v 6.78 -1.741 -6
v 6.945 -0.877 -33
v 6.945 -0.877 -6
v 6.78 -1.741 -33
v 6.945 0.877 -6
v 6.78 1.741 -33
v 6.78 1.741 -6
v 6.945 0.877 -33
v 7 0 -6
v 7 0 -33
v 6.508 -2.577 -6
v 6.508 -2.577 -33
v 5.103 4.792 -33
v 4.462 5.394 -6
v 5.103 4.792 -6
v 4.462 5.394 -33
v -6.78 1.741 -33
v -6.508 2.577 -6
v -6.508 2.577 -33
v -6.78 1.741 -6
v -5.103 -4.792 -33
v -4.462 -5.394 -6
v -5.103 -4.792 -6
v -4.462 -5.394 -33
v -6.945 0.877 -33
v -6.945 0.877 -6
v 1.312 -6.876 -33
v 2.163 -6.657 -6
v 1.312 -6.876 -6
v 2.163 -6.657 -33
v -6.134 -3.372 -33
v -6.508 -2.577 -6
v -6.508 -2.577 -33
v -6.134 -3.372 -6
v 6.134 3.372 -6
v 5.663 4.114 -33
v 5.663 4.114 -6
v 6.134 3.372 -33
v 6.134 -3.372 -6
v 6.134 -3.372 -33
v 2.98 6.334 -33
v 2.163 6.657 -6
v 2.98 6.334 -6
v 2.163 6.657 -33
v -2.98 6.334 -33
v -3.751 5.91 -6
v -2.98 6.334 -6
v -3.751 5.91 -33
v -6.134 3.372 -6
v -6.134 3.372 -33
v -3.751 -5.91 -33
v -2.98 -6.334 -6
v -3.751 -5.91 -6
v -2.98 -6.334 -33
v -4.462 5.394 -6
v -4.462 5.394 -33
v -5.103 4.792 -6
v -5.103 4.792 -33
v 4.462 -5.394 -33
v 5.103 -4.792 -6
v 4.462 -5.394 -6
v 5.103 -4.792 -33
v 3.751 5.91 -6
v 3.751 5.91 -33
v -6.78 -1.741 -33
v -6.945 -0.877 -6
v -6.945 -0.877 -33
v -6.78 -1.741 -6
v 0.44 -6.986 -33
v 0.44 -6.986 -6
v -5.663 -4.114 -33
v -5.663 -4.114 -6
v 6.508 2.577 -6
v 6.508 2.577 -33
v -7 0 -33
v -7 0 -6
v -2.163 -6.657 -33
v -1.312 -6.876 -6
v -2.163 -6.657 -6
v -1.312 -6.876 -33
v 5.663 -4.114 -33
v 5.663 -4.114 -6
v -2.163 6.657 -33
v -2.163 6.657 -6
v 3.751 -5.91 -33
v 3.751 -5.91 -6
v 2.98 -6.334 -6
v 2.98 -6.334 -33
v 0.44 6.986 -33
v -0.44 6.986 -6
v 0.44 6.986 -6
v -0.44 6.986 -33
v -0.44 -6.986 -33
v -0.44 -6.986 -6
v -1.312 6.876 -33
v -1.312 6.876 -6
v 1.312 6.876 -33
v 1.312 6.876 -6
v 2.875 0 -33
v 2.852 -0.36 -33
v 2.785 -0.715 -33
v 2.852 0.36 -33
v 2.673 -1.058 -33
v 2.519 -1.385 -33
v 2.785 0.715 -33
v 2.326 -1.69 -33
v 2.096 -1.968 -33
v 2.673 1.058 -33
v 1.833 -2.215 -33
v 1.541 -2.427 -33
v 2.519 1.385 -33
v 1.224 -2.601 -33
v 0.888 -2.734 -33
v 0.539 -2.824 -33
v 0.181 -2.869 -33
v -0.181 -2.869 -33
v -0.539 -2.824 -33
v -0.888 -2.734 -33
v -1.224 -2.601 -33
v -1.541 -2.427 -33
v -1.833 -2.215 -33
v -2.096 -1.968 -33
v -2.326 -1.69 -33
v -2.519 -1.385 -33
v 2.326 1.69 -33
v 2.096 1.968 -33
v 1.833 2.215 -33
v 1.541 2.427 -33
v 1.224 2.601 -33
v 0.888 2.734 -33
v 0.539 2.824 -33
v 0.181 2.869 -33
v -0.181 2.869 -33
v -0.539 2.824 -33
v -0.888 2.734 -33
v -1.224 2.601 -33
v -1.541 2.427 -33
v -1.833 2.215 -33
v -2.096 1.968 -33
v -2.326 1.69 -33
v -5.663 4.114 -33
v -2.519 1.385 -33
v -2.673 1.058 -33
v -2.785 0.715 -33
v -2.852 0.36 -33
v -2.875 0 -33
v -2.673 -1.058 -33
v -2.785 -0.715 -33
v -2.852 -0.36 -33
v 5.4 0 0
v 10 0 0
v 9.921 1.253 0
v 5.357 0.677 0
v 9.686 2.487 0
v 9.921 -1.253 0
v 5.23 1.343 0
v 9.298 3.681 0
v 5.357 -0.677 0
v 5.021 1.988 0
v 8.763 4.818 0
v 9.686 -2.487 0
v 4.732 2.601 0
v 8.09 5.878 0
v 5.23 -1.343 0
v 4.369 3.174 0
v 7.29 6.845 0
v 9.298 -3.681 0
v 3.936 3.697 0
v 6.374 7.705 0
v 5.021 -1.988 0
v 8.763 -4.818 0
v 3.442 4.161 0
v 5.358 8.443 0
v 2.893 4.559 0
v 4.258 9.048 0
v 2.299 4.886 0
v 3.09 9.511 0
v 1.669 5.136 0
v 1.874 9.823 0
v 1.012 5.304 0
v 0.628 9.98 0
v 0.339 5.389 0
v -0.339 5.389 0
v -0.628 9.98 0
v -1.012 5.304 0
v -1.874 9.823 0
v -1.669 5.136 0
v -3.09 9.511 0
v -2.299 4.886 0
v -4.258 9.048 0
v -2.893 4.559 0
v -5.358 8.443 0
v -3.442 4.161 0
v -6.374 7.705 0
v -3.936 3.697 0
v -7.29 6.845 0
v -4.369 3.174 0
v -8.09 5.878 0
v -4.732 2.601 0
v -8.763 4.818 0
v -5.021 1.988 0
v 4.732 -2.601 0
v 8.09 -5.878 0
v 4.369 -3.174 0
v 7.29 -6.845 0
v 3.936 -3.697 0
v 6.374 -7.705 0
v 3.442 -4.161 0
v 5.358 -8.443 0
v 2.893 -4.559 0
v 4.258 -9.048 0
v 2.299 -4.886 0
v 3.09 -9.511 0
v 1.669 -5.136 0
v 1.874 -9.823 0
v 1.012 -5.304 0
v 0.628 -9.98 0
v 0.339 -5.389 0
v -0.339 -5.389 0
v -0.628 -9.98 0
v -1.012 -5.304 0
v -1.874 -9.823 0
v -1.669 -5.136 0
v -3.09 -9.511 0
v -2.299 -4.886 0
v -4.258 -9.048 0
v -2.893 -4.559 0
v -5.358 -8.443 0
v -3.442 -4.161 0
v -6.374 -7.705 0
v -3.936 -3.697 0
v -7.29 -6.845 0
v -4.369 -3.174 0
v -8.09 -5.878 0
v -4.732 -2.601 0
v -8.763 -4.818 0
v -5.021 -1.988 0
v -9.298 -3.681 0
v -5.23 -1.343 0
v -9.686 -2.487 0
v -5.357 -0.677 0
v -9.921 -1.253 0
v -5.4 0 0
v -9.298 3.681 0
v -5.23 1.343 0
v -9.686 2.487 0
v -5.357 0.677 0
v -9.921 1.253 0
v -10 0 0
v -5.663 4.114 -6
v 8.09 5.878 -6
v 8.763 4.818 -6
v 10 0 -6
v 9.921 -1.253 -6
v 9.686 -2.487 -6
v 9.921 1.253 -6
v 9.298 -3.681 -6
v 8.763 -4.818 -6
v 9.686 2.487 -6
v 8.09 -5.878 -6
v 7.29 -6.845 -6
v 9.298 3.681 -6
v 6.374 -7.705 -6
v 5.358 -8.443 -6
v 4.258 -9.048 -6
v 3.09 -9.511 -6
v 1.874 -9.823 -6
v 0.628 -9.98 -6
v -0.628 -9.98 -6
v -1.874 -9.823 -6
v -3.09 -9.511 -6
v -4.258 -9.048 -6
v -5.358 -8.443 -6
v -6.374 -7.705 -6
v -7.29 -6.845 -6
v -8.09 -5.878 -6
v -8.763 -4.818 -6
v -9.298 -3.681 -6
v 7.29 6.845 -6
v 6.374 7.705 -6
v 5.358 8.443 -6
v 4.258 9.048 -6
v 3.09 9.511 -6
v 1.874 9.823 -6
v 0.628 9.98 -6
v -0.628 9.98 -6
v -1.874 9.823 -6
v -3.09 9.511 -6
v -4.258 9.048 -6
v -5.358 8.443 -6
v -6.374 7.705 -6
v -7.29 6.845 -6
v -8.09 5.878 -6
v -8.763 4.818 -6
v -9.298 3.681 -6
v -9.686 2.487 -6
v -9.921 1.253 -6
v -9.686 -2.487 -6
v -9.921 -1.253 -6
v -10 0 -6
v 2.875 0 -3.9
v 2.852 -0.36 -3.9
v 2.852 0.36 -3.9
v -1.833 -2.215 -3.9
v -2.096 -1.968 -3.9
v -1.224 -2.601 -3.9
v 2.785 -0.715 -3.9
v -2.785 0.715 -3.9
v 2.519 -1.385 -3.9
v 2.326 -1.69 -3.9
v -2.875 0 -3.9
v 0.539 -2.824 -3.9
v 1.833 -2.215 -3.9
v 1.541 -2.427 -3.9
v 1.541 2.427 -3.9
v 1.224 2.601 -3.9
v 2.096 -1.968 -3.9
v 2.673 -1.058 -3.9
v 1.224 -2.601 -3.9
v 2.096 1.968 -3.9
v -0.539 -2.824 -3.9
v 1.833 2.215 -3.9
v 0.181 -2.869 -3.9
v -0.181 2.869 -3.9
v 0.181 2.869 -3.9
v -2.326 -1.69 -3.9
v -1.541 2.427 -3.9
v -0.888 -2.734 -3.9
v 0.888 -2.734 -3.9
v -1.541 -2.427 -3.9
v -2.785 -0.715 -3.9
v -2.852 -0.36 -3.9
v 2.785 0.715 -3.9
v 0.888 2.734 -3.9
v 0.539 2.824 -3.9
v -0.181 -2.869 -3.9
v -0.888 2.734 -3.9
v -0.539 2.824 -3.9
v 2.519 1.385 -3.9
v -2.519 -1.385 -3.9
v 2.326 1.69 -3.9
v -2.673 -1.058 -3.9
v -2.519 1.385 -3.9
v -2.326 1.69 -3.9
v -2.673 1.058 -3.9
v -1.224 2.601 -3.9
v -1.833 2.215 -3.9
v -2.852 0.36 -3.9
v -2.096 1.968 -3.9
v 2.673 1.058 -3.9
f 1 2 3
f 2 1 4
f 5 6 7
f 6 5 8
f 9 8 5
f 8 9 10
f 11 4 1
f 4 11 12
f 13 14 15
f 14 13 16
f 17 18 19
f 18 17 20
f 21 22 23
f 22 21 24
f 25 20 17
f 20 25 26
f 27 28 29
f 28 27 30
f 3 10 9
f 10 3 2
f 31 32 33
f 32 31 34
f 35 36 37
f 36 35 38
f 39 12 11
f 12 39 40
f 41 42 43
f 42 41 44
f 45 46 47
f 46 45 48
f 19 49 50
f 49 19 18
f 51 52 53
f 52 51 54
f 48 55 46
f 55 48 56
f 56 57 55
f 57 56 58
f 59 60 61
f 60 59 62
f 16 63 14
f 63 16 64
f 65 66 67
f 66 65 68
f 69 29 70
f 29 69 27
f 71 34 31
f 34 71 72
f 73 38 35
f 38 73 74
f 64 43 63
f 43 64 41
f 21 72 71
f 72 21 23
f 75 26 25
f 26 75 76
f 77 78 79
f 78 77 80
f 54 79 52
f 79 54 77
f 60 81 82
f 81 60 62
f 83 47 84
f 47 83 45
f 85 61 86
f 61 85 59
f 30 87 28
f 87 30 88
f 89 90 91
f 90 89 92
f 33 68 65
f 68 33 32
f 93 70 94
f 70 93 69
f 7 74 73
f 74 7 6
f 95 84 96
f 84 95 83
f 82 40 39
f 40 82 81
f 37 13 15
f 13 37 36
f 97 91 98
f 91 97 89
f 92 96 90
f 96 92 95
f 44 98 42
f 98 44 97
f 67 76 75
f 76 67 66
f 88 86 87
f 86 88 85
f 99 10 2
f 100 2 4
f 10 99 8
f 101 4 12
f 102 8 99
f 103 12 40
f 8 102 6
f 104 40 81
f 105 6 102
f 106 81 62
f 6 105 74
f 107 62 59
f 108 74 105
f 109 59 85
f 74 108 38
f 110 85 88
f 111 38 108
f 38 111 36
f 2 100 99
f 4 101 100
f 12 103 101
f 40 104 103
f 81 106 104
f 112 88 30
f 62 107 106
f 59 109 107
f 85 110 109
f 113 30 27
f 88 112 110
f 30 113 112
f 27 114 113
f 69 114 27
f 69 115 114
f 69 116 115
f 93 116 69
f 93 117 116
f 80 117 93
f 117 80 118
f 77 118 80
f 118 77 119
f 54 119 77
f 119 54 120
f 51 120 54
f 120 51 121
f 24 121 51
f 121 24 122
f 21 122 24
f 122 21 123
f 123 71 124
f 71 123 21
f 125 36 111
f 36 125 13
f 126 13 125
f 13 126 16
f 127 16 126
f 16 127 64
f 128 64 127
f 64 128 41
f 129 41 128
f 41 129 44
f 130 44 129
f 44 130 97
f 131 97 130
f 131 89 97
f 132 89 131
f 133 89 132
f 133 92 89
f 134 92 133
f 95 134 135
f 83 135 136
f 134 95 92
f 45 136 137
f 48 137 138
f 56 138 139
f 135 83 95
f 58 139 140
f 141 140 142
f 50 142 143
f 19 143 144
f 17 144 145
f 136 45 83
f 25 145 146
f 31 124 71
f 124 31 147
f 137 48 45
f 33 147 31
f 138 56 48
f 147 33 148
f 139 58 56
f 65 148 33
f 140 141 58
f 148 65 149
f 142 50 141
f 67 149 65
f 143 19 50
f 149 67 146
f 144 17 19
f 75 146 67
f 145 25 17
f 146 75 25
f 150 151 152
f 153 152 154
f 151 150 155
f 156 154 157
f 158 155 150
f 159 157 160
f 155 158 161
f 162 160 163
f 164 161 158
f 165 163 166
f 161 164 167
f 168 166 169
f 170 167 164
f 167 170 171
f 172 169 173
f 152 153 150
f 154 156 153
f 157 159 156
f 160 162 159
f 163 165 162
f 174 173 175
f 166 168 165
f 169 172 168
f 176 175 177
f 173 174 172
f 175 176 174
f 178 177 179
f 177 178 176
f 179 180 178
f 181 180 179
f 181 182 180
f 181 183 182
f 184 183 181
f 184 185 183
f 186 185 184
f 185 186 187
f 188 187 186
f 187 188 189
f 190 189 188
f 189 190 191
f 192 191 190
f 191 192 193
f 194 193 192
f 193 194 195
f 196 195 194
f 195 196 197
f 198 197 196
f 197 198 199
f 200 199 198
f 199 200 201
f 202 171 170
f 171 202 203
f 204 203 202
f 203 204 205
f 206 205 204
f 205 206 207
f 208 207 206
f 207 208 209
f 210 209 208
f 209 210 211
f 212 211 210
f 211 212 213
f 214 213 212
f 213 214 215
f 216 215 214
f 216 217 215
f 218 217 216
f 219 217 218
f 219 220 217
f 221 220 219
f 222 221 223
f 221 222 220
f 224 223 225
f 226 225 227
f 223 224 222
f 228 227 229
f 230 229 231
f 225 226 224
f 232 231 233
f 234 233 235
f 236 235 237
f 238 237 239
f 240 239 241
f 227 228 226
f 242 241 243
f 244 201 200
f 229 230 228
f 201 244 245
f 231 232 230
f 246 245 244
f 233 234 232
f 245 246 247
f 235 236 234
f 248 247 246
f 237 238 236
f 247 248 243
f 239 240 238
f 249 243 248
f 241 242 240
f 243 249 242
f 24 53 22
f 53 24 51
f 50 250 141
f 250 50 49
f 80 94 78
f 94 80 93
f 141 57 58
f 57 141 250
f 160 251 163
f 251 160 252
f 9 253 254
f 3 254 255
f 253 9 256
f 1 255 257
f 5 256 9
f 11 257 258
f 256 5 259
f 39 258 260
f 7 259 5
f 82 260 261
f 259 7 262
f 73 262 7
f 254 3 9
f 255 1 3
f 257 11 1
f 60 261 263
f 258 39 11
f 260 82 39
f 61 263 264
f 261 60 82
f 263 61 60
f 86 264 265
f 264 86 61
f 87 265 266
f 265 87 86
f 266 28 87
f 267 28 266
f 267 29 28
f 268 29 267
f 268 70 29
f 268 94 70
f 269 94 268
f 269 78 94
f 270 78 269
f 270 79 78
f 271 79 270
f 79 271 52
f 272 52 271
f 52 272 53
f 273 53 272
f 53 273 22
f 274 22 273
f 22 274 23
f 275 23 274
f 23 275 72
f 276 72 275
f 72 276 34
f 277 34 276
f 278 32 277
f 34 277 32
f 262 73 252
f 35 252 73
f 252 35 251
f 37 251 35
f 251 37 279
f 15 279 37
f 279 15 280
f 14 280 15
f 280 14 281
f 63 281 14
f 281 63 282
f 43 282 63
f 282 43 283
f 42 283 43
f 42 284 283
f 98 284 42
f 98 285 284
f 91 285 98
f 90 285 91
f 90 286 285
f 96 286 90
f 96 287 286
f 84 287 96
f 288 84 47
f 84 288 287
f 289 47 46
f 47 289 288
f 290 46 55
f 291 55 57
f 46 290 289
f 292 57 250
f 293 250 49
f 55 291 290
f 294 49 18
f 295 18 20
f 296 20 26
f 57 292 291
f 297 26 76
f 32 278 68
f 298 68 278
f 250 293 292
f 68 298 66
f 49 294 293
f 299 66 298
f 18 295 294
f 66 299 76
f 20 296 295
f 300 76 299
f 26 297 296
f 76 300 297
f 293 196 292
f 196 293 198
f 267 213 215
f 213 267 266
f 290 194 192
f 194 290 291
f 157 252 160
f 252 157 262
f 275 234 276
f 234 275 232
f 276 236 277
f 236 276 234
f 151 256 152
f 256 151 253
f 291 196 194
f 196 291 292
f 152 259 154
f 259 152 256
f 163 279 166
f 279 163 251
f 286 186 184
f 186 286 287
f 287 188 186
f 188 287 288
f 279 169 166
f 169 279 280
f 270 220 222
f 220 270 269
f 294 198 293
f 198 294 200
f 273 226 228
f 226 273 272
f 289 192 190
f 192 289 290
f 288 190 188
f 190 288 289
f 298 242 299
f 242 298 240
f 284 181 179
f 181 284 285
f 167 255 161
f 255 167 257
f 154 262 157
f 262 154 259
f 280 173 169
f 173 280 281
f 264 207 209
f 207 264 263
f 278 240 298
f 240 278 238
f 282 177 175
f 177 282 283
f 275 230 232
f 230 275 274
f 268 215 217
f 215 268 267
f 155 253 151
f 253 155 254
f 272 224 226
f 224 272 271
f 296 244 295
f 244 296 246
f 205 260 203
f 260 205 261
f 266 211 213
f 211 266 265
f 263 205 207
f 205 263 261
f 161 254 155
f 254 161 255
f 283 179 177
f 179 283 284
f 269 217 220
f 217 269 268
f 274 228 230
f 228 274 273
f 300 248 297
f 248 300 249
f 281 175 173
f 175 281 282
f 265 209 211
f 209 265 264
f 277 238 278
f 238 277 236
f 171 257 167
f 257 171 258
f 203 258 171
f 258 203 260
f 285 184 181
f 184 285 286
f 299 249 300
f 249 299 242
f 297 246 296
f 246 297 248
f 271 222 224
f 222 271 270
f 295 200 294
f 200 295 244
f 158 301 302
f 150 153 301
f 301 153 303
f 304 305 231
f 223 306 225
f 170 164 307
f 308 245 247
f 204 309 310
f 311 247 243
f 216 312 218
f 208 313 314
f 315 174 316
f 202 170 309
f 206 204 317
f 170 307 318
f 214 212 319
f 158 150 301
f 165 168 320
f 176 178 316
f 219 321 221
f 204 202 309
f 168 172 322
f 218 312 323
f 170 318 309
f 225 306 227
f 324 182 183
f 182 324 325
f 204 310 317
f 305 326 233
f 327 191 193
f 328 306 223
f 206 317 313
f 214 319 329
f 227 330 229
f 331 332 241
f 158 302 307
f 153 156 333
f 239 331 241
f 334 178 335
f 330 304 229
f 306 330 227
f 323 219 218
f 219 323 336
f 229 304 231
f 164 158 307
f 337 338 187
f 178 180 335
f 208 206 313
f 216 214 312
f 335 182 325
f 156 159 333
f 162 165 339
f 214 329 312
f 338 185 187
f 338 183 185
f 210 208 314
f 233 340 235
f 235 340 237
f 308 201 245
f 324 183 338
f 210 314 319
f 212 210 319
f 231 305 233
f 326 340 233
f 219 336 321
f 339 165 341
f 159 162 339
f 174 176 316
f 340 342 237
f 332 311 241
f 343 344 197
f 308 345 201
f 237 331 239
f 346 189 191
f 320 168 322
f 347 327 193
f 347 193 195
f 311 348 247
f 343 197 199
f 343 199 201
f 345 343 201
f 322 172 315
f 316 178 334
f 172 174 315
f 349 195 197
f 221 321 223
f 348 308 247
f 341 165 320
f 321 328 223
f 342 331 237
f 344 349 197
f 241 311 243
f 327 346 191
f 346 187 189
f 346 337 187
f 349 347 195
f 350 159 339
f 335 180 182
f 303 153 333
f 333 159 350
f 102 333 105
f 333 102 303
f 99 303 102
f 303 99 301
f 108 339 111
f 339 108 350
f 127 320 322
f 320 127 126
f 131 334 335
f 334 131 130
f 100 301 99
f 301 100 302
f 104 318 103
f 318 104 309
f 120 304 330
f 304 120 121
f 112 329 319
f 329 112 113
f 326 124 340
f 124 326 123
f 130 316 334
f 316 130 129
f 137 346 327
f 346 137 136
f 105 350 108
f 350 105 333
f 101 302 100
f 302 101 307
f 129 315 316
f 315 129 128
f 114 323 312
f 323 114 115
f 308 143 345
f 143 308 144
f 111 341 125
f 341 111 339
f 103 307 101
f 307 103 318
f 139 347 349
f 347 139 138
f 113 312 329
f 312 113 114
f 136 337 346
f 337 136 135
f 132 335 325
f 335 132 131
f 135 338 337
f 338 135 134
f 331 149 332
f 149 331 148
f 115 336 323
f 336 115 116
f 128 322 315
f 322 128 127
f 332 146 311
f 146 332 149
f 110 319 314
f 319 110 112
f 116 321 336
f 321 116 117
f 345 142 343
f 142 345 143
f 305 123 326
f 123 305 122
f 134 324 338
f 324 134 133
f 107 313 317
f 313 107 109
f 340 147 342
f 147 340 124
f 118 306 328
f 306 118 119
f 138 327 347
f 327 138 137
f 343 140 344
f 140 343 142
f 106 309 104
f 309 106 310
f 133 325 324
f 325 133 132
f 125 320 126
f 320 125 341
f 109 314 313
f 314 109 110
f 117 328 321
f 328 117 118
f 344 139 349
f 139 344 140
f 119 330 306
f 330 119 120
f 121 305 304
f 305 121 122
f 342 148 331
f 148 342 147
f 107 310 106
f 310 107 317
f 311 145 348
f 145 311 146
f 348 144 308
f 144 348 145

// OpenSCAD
$fn = 50;


difference() {
	union() {
		translate(v = [0, 0, -33.0000000000]) {
			cylinder(h = 33, r = 7.0000000000);
		}
		translate(v = [0, 0, -6.0000000000]) {
			cylinder(h = 6, r = 10.0000000000);
		}
	}
	union() {
		translate(v = [0, 0, 0]) {
			rotate(a = [0, 0, 0]) {
				difference() {
					union() {
						#translate(v = [0, 0, -33.0000000000]) {
							cylinder(h = 33, r = 2.6000000000);
						}
						#translate(v = [0, 0, -3.9000000000]) {
							cylinder(h = 3.9000000000, r = 7.0000000000, r1 = 2.8750000000, r2 = 5.4000000000);
						}
						#translate(v = [0, 0, -33.0000000000]) {
							cylinder(h = 33, r = 2.8750000000);
						}
						#translate(v = [0, 0, -33.0000000000]) {
							cylinder(h = 33, r = 2.6000000000);
						}
					}
					union();
				}
			}
		}
	}
}
